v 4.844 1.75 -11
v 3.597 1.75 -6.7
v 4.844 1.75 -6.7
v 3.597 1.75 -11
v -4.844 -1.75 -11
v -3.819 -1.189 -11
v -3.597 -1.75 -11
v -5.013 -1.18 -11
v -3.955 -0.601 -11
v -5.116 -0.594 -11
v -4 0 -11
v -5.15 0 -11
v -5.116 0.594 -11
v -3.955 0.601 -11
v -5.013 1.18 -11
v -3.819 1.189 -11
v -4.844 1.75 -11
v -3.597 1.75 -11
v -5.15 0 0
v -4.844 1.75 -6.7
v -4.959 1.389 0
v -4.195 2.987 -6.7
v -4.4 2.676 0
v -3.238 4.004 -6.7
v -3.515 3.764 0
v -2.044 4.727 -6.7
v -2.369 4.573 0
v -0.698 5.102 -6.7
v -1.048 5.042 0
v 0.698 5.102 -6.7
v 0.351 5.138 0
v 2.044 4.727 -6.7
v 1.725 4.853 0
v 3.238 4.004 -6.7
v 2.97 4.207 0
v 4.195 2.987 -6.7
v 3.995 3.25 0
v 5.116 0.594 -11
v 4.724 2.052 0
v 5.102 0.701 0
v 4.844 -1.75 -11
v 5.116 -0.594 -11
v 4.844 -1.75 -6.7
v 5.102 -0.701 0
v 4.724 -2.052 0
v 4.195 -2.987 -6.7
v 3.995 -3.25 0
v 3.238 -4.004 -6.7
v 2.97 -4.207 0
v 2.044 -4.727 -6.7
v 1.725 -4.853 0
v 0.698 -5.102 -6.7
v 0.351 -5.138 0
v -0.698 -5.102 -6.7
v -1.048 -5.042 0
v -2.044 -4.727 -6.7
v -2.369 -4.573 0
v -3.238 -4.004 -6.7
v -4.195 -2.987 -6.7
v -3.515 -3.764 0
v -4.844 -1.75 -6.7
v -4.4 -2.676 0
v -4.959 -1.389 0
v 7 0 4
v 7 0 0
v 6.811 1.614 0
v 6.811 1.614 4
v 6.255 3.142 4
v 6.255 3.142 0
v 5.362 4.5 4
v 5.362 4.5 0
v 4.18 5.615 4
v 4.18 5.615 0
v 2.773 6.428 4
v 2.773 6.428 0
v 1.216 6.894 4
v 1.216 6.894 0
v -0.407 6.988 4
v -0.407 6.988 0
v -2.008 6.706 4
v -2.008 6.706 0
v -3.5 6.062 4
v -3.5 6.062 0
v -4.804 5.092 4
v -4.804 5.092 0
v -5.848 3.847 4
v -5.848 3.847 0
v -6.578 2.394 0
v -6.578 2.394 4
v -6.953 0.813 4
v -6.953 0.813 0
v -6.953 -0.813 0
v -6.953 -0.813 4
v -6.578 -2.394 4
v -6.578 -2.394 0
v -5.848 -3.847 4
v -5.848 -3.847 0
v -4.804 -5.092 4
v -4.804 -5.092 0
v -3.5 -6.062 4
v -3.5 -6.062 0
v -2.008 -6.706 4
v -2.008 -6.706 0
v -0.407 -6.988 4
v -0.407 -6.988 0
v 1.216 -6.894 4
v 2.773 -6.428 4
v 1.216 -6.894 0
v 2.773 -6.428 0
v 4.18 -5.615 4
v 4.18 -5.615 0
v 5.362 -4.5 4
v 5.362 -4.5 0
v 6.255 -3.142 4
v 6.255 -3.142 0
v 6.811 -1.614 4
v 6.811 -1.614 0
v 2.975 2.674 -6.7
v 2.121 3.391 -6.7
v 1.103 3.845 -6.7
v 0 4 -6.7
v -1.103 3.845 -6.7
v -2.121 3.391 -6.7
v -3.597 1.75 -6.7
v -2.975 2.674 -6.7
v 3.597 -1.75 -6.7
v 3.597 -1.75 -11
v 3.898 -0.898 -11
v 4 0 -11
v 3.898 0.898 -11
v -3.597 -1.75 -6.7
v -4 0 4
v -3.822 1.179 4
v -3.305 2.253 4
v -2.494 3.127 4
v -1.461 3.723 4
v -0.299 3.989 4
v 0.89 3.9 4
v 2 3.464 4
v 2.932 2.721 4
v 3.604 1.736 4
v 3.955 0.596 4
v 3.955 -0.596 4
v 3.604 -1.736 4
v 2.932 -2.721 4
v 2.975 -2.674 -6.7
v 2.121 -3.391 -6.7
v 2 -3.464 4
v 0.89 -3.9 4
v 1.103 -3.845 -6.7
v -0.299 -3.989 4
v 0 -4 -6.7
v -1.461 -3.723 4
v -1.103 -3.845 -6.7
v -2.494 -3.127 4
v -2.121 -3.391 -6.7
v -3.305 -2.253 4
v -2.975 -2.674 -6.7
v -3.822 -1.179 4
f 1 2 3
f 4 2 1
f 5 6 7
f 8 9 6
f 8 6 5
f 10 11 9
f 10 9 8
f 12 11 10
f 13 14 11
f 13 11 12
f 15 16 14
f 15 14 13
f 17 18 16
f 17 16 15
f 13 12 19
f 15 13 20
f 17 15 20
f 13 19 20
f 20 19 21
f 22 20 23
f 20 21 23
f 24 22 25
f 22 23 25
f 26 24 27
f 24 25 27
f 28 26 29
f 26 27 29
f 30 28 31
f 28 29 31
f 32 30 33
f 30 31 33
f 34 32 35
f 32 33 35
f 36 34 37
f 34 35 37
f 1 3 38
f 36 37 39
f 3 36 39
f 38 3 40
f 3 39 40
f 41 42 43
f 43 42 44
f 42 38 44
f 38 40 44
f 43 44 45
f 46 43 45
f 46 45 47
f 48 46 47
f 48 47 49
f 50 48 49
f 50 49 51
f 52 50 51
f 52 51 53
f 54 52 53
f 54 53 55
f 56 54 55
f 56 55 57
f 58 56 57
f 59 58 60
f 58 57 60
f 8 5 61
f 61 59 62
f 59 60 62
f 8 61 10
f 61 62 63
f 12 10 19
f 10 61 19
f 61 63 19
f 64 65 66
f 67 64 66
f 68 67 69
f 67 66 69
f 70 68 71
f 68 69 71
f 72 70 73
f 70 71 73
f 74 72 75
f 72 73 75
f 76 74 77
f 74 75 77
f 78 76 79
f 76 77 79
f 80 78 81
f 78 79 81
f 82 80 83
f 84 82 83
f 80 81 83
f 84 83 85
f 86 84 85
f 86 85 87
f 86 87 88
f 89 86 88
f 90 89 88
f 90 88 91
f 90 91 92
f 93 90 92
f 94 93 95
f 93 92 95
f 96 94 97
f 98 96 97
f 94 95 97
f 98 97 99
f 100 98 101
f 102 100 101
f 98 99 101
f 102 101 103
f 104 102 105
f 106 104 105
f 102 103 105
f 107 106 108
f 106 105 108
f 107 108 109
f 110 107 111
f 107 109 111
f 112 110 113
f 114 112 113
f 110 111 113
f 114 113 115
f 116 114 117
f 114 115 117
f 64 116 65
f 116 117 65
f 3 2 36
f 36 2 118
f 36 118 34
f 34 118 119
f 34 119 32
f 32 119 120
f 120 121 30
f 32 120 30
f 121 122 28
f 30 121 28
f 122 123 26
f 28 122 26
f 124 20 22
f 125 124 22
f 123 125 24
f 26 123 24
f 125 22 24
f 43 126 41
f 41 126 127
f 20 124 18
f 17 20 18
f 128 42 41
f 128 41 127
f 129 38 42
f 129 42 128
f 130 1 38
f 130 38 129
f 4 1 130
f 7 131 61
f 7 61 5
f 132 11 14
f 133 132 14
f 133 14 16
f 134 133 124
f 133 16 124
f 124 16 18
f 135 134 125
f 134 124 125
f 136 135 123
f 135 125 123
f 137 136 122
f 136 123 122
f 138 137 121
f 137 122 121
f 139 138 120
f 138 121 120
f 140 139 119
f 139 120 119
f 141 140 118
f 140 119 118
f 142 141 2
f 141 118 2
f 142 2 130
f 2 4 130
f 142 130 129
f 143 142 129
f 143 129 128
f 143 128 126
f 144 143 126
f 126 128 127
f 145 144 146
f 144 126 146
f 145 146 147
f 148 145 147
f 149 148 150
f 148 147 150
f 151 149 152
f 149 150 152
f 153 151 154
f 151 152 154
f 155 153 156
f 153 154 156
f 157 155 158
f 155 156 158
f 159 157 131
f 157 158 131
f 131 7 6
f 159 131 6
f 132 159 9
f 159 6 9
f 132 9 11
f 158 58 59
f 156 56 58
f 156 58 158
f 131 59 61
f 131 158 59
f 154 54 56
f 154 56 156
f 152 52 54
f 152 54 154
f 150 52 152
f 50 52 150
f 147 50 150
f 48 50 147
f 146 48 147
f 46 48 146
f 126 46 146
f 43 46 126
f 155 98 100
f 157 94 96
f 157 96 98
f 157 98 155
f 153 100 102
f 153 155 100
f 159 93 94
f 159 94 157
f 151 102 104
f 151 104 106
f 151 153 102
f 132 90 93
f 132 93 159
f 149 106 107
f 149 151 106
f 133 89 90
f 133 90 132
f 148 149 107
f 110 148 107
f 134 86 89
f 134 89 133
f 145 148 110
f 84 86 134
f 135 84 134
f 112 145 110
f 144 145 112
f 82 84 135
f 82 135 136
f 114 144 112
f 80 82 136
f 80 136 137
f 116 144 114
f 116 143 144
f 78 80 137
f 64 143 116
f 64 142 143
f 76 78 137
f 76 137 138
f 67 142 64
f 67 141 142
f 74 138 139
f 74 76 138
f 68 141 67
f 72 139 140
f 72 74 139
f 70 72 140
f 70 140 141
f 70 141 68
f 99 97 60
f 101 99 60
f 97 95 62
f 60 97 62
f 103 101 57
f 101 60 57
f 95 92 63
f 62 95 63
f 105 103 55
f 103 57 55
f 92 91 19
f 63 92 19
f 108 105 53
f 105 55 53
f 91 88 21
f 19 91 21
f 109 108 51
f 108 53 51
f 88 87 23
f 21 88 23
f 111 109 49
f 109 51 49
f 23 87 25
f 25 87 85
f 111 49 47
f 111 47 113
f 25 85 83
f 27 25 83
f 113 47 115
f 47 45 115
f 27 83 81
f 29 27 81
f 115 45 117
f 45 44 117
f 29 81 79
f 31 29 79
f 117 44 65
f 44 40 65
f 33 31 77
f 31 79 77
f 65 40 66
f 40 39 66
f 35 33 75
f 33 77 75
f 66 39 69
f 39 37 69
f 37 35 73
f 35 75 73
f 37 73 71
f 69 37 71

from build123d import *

# Parameters (mm, degrees)
SKETCH_1_R               = 7
EXTRUDE_1_DEPTH          = 4
SKETCH_2_R               = 5.15
EXTRUDE_2_DEPTH          = 11
SKETCH_3_R               = 4
CUT_EXTRUDE_1_DEPTH      = 1
CUT_EXTRUDE_1_DEPTH_BACK = 16
SKETCH_6_W               = 4.3
SKETCH_6_H               = 3.4
CUT_EXTRUDE_2_DEPTH      = 8
CUT_EXTRUDE_2_DEPTH_BACK = 8


with BuildPart() as part:
    # 草图1 → 凸台-拉伸1 (new body)
    with BuildSketch(Plane.XY):
        Circle(SKETCH_1_R)
    extrude(amount=EXTRUDE_1_DEPTH)

    # 草图2 → 凸台-拉伸2 (add)
    with BuildSketch(Plane(origin=(0, 0, 0), x_dir=(-1, 0, 0), z_dir=(0, 0, -1))):
        Circle(SKETCH_2_R)
    extrude(amount=EXTRUDE_2_DEPTH)

    # 草图3 → 切除-拉伸1 (cut, two sides)
    with BuildSketch(Plane(origin=(0, 0, -11), x_dir=(-1, 0, 0), z_dir=(0, 0, -1))) as cut_extrude_1_sk:
        Circle(SKETCH_3_R)
    extrude(amount=CUT_EXTRUDE_1_DEPTH, mode=Mode.SUBTRACT)
    extrude(cut_extrude_1_sk.sketch, amount=-CUT_EXTRUDE_1_DEPTH_BACK, mode=Mode.SUBTRACT)

    # 草图6 → 切除-拉伸2 (cut, two sides)
    with BuildSketch(Plane(origin=(0, 0, 0), x_dir=(0, 0, -1), z_dir=(1, 0, 0))) as cut_extrude_2_sk:
        with Locations((8.85, 3.45)):
            Rectangle(SKETCH_6_W, SKETCH_6_H)
        with Locations((8.85, -3.45)):
            Rectangle(SKETCH_6_W, SKETCH_6_H)
    extrude(amount=CUT_EXTRUDE_2_DEPTH, mode=Mode.SUBTRACT)
    extrude(cut_extrude_2_sk.sketch, amount=-CUT_EXTRUDE_2_DEPTH_BACK, mode=Mode.SUBTRACT)


solid = part.part
